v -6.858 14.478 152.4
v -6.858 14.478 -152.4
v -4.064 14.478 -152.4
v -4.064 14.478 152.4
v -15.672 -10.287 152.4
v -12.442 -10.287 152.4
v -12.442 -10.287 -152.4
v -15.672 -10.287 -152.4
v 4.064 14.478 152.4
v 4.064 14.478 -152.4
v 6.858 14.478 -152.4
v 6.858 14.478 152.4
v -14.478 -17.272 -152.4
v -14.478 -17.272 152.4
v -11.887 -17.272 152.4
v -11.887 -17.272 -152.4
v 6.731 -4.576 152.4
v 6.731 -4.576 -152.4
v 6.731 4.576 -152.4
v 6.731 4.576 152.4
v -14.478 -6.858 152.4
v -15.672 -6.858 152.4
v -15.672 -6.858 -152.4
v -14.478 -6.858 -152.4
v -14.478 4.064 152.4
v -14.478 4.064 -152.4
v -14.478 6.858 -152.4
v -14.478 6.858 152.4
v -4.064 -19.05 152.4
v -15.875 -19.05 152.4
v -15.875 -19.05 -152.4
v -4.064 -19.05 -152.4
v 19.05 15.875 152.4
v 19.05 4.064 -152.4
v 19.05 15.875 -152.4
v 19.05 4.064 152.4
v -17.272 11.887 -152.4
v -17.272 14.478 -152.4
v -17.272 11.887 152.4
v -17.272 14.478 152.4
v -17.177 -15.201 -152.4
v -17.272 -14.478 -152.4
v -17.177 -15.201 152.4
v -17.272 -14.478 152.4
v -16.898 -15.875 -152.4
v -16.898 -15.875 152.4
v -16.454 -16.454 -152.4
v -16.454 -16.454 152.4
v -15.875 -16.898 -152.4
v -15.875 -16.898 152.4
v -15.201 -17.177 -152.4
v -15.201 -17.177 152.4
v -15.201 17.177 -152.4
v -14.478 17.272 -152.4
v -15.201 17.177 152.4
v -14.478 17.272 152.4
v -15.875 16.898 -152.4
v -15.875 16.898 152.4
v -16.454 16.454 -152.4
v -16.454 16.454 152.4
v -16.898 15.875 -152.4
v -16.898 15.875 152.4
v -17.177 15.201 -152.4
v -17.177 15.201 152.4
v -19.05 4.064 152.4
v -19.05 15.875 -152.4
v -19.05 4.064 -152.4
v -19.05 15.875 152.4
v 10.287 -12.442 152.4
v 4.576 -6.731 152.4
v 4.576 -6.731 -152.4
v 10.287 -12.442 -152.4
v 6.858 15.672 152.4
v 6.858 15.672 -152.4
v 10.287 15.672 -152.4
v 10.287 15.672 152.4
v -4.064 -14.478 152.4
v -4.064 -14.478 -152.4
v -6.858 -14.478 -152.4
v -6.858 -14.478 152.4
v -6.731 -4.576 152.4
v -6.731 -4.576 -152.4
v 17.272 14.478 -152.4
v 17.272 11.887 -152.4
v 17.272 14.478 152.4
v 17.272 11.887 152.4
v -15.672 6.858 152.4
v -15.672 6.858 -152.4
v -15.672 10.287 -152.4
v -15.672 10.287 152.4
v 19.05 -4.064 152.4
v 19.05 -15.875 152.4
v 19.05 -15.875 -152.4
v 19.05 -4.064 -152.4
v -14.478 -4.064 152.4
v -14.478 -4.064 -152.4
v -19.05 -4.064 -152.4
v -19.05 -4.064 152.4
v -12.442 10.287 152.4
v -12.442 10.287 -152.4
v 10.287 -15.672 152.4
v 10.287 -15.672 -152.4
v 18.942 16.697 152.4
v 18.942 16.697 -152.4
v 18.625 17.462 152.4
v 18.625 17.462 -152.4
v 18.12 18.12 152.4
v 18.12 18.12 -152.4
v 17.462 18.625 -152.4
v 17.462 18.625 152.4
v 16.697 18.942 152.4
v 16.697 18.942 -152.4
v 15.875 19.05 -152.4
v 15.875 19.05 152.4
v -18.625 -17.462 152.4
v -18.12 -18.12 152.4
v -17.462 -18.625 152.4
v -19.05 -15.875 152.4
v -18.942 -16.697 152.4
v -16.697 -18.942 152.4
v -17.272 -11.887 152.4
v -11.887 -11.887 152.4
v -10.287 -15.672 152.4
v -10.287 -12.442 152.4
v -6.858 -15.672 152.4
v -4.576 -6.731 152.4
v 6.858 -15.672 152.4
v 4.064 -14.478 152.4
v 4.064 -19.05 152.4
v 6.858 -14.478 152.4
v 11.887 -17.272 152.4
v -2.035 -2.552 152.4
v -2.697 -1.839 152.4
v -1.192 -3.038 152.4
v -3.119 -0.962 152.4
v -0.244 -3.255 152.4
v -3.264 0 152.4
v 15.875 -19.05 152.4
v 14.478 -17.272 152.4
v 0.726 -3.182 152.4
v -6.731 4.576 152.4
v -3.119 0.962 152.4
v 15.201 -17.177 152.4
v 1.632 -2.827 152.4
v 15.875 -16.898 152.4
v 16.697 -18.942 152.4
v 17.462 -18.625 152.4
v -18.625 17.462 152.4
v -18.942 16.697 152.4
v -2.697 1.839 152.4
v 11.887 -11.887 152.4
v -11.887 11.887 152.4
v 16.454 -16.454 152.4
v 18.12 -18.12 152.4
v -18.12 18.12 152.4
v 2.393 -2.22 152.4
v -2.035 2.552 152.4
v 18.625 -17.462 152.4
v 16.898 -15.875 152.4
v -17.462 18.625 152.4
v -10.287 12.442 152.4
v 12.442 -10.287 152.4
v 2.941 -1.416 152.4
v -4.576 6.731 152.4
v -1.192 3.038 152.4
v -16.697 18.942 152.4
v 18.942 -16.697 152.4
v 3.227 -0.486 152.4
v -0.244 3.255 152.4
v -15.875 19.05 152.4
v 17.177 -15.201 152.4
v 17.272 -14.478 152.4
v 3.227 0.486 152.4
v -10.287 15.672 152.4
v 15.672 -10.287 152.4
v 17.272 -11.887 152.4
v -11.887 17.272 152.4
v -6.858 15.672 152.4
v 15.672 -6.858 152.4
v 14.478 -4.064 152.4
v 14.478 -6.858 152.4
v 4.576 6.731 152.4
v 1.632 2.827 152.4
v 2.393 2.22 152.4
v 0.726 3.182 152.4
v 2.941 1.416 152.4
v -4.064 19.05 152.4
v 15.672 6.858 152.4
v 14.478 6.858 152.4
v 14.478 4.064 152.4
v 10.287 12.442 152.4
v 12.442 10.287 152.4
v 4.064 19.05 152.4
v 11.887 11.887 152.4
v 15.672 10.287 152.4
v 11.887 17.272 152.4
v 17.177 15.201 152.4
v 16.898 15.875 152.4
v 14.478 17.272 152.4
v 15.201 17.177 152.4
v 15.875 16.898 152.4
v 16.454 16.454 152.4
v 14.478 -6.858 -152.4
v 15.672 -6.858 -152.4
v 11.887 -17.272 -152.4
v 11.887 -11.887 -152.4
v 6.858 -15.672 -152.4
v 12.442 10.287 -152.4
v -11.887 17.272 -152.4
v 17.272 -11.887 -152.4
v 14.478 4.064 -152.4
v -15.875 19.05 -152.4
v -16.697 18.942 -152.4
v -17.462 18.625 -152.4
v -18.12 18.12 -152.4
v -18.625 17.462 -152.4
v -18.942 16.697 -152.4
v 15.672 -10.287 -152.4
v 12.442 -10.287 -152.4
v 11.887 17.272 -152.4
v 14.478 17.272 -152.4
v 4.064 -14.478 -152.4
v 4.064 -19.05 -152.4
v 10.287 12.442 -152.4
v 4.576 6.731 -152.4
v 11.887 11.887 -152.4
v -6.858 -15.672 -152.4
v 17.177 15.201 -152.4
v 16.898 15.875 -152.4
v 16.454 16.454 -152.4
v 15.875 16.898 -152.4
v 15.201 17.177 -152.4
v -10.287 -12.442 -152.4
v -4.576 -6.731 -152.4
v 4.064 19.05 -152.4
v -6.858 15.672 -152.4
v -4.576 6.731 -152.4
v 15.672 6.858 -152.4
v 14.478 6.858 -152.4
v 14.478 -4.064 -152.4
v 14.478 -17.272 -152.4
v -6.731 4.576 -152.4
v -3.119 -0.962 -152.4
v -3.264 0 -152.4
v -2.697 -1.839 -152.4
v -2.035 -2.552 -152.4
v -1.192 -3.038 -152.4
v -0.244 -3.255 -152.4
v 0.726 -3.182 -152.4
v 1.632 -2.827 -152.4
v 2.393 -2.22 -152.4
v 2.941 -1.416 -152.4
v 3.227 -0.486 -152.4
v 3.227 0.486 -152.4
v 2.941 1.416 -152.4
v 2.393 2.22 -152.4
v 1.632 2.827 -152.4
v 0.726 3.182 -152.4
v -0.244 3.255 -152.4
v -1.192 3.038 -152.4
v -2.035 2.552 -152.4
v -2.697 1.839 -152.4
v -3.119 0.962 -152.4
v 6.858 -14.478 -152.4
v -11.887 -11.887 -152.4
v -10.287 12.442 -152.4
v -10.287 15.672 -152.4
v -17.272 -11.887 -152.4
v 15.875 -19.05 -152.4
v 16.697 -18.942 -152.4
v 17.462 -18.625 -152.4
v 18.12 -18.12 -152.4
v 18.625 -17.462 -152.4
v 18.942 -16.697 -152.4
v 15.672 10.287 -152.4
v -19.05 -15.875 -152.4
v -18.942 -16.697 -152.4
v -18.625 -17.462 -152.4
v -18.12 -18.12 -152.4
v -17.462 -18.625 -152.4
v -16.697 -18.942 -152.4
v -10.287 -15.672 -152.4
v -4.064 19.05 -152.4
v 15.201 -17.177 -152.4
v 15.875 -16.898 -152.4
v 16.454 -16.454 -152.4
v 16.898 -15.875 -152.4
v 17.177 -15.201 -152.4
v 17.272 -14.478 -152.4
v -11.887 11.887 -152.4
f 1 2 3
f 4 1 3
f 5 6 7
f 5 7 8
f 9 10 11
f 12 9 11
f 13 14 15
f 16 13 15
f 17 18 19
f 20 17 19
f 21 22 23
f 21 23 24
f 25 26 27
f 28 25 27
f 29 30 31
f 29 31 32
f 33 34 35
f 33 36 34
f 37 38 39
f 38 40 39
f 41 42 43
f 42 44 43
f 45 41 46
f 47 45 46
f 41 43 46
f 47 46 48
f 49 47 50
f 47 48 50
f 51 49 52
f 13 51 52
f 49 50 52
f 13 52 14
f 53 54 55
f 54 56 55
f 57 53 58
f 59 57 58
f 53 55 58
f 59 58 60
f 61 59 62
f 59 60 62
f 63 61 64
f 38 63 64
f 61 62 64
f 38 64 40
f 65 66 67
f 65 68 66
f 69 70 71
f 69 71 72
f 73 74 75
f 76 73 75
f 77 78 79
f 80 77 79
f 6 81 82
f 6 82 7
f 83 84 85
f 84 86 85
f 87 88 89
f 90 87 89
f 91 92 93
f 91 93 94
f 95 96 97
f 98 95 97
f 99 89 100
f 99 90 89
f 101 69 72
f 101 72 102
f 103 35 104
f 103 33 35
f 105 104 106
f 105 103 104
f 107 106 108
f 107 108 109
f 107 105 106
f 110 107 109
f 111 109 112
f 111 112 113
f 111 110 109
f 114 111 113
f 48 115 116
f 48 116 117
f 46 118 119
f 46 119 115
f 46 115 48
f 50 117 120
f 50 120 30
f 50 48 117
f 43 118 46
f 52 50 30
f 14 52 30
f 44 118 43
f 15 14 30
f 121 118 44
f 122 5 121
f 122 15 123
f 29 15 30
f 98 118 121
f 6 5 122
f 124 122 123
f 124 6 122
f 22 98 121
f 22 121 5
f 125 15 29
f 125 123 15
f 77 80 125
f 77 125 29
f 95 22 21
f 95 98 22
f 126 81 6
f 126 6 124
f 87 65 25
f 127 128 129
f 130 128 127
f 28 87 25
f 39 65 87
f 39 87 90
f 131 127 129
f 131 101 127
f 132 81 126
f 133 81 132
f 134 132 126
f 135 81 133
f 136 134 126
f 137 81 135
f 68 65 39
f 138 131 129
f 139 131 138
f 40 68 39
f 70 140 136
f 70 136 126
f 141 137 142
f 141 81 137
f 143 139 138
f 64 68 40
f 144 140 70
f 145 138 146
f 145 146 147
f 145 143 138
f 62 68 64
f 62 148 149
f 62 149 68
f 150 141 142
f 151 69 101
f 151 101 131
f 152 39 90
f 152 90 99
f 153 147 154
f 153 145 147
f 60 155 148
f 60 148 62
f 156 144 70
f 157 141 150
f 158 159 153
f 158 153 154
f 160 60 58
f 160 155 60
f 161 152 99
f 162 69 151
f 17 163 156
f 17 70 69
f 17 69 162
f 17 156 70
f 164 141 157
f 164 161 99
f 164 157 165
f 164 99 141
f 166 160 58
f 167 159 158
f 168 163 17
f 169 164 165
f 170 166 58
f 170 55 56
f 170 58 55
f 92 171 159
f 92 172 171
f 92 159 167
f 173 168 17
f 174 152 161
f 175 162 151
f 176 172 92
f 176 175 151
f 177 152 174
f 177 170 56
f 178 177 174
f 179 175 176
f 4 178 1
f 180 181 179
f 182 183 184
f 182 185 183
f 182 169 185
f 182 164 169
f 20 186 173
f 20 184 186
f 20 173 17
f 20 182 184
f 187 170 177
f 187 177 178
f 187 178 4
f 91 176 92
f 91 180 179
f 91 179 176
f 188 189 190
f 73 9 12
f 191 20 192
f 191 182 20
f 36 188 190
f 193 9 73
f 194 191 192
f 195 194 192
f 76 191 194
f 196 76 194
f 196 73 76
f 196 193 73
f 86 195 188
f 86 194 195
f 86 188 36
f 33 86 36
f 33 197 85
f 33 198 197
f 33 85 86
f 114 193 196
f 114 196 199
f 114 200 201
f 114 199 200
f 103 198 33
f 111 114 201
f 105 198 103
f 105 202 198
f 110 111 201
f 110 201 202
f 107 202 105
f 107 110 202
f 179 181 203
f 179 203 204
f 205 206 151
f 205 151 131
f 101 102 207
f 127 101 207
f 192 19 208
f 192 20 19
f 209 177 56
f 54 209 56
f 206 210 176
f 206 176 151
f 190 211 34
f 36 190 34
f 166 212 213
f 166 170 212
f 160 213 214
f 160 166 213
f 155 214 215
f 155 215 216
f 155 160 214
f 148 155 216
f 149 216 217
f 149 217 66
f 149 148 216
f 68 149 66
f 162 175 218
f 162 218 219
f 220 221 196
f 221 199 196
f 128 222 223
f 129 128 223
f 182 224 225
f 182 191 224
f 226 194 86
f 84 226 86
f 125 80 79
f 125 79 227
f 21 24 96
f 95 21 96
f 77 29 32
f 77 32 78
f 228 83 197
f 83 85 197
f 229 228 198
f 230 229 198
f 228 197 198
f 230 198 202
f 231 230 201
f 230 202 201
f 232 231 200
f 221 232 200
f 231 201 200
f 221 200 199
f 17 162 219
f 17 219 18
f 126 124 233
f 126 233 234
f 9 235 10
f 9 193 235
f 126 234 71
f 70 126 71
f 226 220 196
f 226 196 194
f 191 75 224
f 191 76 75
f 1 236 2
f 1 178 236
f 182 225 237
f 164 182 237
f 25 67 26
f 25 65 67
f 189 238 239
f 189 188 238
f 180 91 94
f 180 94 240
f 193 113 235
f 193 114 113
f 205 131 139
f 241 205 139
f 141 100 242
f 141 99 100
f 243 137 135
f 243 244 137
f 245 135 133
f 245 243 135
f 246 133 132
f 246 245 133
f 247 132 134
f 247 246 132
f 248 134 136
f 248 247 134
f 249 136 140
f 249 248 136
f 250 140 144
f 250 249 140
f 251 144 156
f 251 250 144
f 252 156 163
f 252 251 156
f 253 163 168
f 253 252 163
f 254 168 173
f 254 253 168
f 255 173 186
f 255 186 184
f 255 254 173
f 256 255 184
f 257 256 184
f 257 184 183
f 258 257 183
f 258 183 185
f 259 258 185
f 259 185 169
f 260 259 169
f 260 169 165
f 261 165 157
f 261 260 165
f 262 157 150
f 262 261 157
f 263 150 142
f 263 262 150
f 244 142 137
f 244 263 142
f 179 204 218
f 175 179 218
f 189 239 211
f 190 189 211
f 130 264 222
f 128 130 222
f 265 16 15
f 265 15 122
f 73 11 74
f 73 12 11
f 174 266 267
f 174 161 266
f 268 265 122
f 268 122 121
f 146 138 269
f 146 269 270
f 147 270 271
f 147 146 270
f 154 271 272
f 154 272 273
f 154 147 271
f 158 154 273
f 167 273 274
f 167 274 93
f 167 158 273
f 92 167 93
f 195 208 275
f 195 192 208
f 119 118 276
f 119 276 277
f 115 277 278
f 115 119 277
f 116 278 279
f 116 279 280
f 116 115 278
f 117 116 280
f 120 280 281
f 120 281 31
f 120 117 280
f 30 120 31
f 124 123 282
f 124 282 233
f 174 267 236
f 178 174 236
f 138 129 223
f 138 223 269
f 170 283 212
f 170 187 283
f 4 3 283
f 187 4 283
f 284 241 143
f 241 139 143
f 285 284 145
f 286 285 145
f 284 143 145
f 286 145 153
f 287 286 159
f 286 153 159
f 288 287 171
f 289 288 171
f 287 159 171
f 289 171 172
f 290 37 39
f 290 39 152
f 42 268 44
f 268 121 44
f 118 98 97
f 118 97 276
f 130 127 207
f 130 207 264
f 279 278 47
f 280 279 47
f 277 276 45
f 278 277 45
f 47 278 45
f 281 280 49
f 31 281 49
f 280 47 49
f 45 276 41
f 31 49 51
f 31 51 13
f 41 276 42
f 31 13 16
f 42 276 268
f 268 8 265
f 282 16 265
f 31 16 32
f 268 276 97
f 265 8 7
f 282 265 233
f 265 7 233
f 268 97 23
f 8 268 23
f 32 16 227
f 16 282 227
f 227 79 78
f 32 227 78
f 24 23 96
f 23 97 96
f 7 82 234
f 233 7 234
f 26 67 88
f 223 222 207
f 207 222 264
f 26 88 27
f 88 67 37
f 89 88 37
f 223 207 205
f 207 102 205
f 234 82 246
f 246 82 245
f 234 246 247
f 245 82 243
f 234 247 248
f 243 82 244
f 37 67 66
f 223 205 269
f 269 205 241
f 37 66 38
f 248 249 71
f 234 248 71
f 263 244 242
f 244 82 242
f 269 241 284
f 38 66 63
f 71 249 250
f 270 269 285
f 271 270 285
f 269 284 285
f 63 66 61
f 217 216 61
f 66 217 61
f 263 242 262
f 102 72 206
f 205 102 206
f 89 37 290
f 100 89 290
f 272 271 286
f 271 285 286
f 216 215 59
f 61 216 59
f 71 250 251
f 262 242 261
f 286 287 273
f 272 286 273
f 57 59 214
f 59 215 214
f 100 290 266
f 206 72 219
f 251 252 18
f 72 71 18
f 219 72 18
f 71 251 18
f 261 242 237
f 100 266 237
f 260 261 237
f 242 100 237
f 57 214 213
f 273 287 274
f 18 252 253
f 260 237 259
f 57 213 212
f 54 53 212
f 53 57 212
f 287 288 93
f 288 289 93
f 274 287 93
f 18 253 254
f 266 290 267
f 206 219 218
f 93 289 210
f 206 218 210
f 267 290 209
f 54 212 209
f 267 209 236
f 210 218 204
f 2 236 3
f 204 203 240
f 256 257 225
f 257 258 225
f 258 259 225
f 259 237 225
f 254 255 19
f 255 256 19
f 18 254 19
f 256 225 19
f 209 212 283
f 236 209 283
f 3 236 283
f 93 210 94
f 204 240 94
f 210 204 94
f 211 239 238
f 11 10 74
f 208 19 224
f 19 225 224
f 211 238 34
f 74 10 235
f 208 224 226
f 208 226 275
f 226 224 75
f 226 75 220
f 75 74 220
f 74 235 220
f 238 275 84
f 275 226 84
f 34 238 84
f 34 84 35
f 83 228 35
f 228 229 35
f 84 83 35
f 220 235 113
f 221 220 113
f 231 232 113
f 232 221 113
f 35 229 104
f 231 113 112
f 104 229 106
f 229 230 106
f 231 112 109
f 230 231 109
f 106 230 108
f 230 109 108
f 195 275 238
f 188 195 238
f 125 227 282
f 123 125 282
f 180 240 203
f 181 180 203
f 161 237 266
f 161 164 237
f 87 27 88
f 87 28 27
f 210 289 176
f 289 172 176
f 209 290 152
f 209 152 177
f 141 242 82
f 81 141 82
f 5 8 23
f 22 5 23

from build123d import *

# Parameters (mm, degrees)
SKETCH1_R           = 3.2639
BOSS_EXTRUDE1_DEPTH = 152.4


with BuildPart() as part:
    # Sketch1 → Boss-Extrude1 (new, symmetric)
    with BuildSketch(Plane.XY):
        with BuildLine():
            Line((-6.731, 4.575738531), (-6.731, -4.575738531))
            Line((-6.731, -4.575738531), (-12.442261469, -10.287))
            Line((-12.442261469, -10.287), (-15.6718, -10.287))
            Line((-15.6718, -10.287), (-15.6718, -6.858))
            Line((-15.6718, -6.858), (-14.478, -6.858))
            Line((-14.478, -6.858), (-14.478, -4.064))
            Line((-14.478, -4.064), (-19.05, -4.064))
            Line((-19.05, -4.064), (-19.05, -15.875))
            ThreePointArc((-19.05, -15.875), (-18.12006403, -18.12006403), (-15.875, -19.05))
            Line((-15.875, -19.05), (-4.064, -19.05))
            Line((-4.064, -19.05), (-4.064, -14.478))
            Line((-4.064, -14.478), (-6.858, -14.478))
            Line((-6.858, -14.478), (-6.858, -15.6718))
            Line((-6.858, -15.6718), (-10.287, -15.6718))
            Line((-10.287, -15.6718), (-10.287, -12.442261469))
            Line((-10.287, -12.442261469), (-4.575738531, -6.731))
            Line((-4.575738531, -6.731), (4.575738531, -6.731))
            Line((4.575738531, -6.731), (10.287, -12.442261469))
            Line((10.287, -12.442261469), (10.287, -15.6718))
            Line((10.287, -15.6718), (6.858, -15.6718))
            Line((6.858, -15.6718), (6.858, -14.478))
            Line((6.858, -14.478), (4.064, -14.478))
            Line((4.064, -14.478), (4.064, -19.05))
            Line((4.064, -19.05), (15.875, -19.05))
            ThreePointArc((15.875, -19.05), (18.12006403, -18.12006403), (19.05, -15.875))
            Line((19.05, -15.875), (19.05, -4.064))
            Line((19.05, -4.064), (14.478, -4.064))
            Line((14.478, -4.064), (14.478, -6.858))
            Line((14.478, -6.858), (15.6718, -6.858))
            Line((15.6718, -6.858), (15.6718, -10.287))
            Line((15.6718, -10.287), (12.442261469, -10.287))
            Line((12.442261469, -10.287), (6.731, -4.575738531))
            Line((6.731, -4.575738531), (6.731, 4.575738531))
            Line((6.731, 4.575738531), (12.442261469, 10.287))
            Line((12.442261469, 10.287), (15.6718, 10.287))
            Line((15.6718, 10.287), (15.6718, 6.858))
            Line((15.6718, 6.858), (14.478, 6.858))
            Line((14.478, 6.858), (14.478, 4.064))
            Line((14.478, 4.064), (19.05, 4.064))
            Line((19.05, 4.064), (19.05, 15.875))
            ThreePointArc((19.05, 15.875), (18.12006403, 18.12006403), (15.875, 19.05))
            Line((15.875, 19.05), (4.064, 19.05))
            Line((4.064, 19.05), (4.064, 14.478))
            Line((4.064, 14.478), (6.858, 14.478))
            Line((6.858, 14.478), (6.858, 15.6718))
            Line((6.858, 15.6718), (10.287, 15.6718))
            Line((10.287, 15.6718), (10.287, 12.442261469))
            Line((10.287, 12.442261469), (4.575738531, 6.731))
            Line((4.575738531, 6.731), (-4.575738531, 6.731))
            Line((-4.575738531, 6.731), (-10.287, 12.442261469))
            Line((-10.287, 12.442261469), (-10.287, 15.6718))
            Line((-10.287, 15.6718), (-6.858, 15.6718))
            Line((-6.858, 15.6718), (-6.858, 14.478))
            Line((-6.858, 14.478), (-4.064, 14.478))
            Line((-4.064, 14.478), (-4.064, 19.05))
            Line((-4.064, 19.05), (-15.875, 19.05))
            ThreePointArc((-15.875, 19.05), (-18.12006403, 18.12006403), (-19.05, 15.875))
            Line((-19.05, 15.875), (-19.05, 4.064))
            Line((-19.05, 4.064), (-14.478, 4.064))
            Line((-14.478, 4.064), (-14.478, 6.858))
            Line((-14.478, 6.858), (-15.6718, 6.858))
            Line((-15.6718, 6.858), (-15.6718, 10.287))
            Line((-15.6718, 10.287), (-12.442261469, 10.287))
            Line((-12.442261469, 10.287), (-6.731, 4.575738531))
        make_face()
        with Locations(Location((0, 0, 0), (0, 0, 180))):
            Circle(SKETCH1_R, mode=Mode.SUBTRACT)
        with BuildLine():
            Line((-11.8872, 17.272), (-14.478, 17.272))
            ThreePointArc((-14.478, 17.272), (-16.453656347, 16.453656347), (-17.272, 14.478))
            Line((-17.272, 14.478), (-17.272, 11.8872))
            Line((-17.272, 11.8872), (-11.8872, 11.8872))
            Line((-11.8872, 11.8872), (-11.8872, 17.272))
        make_face(mode=Mode.SUBTRACT)
        with BuildLine():
            Line((14.478, 17.272), (11.8872, 17.272))
            Line((11.8872, 17.272), (11.8872, 11.8872))
            Line((11.8872, 11.8872), (17.272, 11.8872))
            Line((17.272, 11.8872), (17.272, 14.478))
            ThreePointArc((17.272, 14.478), (16.453656347, 16.453656347), (14.478, 17.272))
        make_face(mode=Mode.SUBTRACT)
        with BuildLine():
            Line((11.8872, -17.272), (14.478, -17.272))
            ThreePointArc((14.478, -17.272), (16.453656347, -16.453656347), (17.272, -14.478))
            Line((17.272, -14.478), (17.272, -11.8872))
            Line((17.272, -11.8872), (11.8872, -11.8872))
            Line((11.8872, -11.8872), (11.8872, -17.272))
        make_face(mode=Mode.SUBTRACT)
        with BuildLine():
            Line((-14.478, -17.272), (-11.8872, -17.272))
            Line((-11.8872, -17.272), (-11.8872, -11.8872))
            Line((-11.8872, -11.8872), (-17.272, -11.8872))
            Line((-17.272, -11.8872), (-17.272, -14.478))
            ThreePointArc((-17.272, -14.478), (-16.453656347, -16.453656347), (-14.478, -17.272))
        make_face(mode=Mode.SUBTRACT)
    extrude(amount=BOSS_EXTRUDE1_DEPTH, both=True)


solid = part.part
